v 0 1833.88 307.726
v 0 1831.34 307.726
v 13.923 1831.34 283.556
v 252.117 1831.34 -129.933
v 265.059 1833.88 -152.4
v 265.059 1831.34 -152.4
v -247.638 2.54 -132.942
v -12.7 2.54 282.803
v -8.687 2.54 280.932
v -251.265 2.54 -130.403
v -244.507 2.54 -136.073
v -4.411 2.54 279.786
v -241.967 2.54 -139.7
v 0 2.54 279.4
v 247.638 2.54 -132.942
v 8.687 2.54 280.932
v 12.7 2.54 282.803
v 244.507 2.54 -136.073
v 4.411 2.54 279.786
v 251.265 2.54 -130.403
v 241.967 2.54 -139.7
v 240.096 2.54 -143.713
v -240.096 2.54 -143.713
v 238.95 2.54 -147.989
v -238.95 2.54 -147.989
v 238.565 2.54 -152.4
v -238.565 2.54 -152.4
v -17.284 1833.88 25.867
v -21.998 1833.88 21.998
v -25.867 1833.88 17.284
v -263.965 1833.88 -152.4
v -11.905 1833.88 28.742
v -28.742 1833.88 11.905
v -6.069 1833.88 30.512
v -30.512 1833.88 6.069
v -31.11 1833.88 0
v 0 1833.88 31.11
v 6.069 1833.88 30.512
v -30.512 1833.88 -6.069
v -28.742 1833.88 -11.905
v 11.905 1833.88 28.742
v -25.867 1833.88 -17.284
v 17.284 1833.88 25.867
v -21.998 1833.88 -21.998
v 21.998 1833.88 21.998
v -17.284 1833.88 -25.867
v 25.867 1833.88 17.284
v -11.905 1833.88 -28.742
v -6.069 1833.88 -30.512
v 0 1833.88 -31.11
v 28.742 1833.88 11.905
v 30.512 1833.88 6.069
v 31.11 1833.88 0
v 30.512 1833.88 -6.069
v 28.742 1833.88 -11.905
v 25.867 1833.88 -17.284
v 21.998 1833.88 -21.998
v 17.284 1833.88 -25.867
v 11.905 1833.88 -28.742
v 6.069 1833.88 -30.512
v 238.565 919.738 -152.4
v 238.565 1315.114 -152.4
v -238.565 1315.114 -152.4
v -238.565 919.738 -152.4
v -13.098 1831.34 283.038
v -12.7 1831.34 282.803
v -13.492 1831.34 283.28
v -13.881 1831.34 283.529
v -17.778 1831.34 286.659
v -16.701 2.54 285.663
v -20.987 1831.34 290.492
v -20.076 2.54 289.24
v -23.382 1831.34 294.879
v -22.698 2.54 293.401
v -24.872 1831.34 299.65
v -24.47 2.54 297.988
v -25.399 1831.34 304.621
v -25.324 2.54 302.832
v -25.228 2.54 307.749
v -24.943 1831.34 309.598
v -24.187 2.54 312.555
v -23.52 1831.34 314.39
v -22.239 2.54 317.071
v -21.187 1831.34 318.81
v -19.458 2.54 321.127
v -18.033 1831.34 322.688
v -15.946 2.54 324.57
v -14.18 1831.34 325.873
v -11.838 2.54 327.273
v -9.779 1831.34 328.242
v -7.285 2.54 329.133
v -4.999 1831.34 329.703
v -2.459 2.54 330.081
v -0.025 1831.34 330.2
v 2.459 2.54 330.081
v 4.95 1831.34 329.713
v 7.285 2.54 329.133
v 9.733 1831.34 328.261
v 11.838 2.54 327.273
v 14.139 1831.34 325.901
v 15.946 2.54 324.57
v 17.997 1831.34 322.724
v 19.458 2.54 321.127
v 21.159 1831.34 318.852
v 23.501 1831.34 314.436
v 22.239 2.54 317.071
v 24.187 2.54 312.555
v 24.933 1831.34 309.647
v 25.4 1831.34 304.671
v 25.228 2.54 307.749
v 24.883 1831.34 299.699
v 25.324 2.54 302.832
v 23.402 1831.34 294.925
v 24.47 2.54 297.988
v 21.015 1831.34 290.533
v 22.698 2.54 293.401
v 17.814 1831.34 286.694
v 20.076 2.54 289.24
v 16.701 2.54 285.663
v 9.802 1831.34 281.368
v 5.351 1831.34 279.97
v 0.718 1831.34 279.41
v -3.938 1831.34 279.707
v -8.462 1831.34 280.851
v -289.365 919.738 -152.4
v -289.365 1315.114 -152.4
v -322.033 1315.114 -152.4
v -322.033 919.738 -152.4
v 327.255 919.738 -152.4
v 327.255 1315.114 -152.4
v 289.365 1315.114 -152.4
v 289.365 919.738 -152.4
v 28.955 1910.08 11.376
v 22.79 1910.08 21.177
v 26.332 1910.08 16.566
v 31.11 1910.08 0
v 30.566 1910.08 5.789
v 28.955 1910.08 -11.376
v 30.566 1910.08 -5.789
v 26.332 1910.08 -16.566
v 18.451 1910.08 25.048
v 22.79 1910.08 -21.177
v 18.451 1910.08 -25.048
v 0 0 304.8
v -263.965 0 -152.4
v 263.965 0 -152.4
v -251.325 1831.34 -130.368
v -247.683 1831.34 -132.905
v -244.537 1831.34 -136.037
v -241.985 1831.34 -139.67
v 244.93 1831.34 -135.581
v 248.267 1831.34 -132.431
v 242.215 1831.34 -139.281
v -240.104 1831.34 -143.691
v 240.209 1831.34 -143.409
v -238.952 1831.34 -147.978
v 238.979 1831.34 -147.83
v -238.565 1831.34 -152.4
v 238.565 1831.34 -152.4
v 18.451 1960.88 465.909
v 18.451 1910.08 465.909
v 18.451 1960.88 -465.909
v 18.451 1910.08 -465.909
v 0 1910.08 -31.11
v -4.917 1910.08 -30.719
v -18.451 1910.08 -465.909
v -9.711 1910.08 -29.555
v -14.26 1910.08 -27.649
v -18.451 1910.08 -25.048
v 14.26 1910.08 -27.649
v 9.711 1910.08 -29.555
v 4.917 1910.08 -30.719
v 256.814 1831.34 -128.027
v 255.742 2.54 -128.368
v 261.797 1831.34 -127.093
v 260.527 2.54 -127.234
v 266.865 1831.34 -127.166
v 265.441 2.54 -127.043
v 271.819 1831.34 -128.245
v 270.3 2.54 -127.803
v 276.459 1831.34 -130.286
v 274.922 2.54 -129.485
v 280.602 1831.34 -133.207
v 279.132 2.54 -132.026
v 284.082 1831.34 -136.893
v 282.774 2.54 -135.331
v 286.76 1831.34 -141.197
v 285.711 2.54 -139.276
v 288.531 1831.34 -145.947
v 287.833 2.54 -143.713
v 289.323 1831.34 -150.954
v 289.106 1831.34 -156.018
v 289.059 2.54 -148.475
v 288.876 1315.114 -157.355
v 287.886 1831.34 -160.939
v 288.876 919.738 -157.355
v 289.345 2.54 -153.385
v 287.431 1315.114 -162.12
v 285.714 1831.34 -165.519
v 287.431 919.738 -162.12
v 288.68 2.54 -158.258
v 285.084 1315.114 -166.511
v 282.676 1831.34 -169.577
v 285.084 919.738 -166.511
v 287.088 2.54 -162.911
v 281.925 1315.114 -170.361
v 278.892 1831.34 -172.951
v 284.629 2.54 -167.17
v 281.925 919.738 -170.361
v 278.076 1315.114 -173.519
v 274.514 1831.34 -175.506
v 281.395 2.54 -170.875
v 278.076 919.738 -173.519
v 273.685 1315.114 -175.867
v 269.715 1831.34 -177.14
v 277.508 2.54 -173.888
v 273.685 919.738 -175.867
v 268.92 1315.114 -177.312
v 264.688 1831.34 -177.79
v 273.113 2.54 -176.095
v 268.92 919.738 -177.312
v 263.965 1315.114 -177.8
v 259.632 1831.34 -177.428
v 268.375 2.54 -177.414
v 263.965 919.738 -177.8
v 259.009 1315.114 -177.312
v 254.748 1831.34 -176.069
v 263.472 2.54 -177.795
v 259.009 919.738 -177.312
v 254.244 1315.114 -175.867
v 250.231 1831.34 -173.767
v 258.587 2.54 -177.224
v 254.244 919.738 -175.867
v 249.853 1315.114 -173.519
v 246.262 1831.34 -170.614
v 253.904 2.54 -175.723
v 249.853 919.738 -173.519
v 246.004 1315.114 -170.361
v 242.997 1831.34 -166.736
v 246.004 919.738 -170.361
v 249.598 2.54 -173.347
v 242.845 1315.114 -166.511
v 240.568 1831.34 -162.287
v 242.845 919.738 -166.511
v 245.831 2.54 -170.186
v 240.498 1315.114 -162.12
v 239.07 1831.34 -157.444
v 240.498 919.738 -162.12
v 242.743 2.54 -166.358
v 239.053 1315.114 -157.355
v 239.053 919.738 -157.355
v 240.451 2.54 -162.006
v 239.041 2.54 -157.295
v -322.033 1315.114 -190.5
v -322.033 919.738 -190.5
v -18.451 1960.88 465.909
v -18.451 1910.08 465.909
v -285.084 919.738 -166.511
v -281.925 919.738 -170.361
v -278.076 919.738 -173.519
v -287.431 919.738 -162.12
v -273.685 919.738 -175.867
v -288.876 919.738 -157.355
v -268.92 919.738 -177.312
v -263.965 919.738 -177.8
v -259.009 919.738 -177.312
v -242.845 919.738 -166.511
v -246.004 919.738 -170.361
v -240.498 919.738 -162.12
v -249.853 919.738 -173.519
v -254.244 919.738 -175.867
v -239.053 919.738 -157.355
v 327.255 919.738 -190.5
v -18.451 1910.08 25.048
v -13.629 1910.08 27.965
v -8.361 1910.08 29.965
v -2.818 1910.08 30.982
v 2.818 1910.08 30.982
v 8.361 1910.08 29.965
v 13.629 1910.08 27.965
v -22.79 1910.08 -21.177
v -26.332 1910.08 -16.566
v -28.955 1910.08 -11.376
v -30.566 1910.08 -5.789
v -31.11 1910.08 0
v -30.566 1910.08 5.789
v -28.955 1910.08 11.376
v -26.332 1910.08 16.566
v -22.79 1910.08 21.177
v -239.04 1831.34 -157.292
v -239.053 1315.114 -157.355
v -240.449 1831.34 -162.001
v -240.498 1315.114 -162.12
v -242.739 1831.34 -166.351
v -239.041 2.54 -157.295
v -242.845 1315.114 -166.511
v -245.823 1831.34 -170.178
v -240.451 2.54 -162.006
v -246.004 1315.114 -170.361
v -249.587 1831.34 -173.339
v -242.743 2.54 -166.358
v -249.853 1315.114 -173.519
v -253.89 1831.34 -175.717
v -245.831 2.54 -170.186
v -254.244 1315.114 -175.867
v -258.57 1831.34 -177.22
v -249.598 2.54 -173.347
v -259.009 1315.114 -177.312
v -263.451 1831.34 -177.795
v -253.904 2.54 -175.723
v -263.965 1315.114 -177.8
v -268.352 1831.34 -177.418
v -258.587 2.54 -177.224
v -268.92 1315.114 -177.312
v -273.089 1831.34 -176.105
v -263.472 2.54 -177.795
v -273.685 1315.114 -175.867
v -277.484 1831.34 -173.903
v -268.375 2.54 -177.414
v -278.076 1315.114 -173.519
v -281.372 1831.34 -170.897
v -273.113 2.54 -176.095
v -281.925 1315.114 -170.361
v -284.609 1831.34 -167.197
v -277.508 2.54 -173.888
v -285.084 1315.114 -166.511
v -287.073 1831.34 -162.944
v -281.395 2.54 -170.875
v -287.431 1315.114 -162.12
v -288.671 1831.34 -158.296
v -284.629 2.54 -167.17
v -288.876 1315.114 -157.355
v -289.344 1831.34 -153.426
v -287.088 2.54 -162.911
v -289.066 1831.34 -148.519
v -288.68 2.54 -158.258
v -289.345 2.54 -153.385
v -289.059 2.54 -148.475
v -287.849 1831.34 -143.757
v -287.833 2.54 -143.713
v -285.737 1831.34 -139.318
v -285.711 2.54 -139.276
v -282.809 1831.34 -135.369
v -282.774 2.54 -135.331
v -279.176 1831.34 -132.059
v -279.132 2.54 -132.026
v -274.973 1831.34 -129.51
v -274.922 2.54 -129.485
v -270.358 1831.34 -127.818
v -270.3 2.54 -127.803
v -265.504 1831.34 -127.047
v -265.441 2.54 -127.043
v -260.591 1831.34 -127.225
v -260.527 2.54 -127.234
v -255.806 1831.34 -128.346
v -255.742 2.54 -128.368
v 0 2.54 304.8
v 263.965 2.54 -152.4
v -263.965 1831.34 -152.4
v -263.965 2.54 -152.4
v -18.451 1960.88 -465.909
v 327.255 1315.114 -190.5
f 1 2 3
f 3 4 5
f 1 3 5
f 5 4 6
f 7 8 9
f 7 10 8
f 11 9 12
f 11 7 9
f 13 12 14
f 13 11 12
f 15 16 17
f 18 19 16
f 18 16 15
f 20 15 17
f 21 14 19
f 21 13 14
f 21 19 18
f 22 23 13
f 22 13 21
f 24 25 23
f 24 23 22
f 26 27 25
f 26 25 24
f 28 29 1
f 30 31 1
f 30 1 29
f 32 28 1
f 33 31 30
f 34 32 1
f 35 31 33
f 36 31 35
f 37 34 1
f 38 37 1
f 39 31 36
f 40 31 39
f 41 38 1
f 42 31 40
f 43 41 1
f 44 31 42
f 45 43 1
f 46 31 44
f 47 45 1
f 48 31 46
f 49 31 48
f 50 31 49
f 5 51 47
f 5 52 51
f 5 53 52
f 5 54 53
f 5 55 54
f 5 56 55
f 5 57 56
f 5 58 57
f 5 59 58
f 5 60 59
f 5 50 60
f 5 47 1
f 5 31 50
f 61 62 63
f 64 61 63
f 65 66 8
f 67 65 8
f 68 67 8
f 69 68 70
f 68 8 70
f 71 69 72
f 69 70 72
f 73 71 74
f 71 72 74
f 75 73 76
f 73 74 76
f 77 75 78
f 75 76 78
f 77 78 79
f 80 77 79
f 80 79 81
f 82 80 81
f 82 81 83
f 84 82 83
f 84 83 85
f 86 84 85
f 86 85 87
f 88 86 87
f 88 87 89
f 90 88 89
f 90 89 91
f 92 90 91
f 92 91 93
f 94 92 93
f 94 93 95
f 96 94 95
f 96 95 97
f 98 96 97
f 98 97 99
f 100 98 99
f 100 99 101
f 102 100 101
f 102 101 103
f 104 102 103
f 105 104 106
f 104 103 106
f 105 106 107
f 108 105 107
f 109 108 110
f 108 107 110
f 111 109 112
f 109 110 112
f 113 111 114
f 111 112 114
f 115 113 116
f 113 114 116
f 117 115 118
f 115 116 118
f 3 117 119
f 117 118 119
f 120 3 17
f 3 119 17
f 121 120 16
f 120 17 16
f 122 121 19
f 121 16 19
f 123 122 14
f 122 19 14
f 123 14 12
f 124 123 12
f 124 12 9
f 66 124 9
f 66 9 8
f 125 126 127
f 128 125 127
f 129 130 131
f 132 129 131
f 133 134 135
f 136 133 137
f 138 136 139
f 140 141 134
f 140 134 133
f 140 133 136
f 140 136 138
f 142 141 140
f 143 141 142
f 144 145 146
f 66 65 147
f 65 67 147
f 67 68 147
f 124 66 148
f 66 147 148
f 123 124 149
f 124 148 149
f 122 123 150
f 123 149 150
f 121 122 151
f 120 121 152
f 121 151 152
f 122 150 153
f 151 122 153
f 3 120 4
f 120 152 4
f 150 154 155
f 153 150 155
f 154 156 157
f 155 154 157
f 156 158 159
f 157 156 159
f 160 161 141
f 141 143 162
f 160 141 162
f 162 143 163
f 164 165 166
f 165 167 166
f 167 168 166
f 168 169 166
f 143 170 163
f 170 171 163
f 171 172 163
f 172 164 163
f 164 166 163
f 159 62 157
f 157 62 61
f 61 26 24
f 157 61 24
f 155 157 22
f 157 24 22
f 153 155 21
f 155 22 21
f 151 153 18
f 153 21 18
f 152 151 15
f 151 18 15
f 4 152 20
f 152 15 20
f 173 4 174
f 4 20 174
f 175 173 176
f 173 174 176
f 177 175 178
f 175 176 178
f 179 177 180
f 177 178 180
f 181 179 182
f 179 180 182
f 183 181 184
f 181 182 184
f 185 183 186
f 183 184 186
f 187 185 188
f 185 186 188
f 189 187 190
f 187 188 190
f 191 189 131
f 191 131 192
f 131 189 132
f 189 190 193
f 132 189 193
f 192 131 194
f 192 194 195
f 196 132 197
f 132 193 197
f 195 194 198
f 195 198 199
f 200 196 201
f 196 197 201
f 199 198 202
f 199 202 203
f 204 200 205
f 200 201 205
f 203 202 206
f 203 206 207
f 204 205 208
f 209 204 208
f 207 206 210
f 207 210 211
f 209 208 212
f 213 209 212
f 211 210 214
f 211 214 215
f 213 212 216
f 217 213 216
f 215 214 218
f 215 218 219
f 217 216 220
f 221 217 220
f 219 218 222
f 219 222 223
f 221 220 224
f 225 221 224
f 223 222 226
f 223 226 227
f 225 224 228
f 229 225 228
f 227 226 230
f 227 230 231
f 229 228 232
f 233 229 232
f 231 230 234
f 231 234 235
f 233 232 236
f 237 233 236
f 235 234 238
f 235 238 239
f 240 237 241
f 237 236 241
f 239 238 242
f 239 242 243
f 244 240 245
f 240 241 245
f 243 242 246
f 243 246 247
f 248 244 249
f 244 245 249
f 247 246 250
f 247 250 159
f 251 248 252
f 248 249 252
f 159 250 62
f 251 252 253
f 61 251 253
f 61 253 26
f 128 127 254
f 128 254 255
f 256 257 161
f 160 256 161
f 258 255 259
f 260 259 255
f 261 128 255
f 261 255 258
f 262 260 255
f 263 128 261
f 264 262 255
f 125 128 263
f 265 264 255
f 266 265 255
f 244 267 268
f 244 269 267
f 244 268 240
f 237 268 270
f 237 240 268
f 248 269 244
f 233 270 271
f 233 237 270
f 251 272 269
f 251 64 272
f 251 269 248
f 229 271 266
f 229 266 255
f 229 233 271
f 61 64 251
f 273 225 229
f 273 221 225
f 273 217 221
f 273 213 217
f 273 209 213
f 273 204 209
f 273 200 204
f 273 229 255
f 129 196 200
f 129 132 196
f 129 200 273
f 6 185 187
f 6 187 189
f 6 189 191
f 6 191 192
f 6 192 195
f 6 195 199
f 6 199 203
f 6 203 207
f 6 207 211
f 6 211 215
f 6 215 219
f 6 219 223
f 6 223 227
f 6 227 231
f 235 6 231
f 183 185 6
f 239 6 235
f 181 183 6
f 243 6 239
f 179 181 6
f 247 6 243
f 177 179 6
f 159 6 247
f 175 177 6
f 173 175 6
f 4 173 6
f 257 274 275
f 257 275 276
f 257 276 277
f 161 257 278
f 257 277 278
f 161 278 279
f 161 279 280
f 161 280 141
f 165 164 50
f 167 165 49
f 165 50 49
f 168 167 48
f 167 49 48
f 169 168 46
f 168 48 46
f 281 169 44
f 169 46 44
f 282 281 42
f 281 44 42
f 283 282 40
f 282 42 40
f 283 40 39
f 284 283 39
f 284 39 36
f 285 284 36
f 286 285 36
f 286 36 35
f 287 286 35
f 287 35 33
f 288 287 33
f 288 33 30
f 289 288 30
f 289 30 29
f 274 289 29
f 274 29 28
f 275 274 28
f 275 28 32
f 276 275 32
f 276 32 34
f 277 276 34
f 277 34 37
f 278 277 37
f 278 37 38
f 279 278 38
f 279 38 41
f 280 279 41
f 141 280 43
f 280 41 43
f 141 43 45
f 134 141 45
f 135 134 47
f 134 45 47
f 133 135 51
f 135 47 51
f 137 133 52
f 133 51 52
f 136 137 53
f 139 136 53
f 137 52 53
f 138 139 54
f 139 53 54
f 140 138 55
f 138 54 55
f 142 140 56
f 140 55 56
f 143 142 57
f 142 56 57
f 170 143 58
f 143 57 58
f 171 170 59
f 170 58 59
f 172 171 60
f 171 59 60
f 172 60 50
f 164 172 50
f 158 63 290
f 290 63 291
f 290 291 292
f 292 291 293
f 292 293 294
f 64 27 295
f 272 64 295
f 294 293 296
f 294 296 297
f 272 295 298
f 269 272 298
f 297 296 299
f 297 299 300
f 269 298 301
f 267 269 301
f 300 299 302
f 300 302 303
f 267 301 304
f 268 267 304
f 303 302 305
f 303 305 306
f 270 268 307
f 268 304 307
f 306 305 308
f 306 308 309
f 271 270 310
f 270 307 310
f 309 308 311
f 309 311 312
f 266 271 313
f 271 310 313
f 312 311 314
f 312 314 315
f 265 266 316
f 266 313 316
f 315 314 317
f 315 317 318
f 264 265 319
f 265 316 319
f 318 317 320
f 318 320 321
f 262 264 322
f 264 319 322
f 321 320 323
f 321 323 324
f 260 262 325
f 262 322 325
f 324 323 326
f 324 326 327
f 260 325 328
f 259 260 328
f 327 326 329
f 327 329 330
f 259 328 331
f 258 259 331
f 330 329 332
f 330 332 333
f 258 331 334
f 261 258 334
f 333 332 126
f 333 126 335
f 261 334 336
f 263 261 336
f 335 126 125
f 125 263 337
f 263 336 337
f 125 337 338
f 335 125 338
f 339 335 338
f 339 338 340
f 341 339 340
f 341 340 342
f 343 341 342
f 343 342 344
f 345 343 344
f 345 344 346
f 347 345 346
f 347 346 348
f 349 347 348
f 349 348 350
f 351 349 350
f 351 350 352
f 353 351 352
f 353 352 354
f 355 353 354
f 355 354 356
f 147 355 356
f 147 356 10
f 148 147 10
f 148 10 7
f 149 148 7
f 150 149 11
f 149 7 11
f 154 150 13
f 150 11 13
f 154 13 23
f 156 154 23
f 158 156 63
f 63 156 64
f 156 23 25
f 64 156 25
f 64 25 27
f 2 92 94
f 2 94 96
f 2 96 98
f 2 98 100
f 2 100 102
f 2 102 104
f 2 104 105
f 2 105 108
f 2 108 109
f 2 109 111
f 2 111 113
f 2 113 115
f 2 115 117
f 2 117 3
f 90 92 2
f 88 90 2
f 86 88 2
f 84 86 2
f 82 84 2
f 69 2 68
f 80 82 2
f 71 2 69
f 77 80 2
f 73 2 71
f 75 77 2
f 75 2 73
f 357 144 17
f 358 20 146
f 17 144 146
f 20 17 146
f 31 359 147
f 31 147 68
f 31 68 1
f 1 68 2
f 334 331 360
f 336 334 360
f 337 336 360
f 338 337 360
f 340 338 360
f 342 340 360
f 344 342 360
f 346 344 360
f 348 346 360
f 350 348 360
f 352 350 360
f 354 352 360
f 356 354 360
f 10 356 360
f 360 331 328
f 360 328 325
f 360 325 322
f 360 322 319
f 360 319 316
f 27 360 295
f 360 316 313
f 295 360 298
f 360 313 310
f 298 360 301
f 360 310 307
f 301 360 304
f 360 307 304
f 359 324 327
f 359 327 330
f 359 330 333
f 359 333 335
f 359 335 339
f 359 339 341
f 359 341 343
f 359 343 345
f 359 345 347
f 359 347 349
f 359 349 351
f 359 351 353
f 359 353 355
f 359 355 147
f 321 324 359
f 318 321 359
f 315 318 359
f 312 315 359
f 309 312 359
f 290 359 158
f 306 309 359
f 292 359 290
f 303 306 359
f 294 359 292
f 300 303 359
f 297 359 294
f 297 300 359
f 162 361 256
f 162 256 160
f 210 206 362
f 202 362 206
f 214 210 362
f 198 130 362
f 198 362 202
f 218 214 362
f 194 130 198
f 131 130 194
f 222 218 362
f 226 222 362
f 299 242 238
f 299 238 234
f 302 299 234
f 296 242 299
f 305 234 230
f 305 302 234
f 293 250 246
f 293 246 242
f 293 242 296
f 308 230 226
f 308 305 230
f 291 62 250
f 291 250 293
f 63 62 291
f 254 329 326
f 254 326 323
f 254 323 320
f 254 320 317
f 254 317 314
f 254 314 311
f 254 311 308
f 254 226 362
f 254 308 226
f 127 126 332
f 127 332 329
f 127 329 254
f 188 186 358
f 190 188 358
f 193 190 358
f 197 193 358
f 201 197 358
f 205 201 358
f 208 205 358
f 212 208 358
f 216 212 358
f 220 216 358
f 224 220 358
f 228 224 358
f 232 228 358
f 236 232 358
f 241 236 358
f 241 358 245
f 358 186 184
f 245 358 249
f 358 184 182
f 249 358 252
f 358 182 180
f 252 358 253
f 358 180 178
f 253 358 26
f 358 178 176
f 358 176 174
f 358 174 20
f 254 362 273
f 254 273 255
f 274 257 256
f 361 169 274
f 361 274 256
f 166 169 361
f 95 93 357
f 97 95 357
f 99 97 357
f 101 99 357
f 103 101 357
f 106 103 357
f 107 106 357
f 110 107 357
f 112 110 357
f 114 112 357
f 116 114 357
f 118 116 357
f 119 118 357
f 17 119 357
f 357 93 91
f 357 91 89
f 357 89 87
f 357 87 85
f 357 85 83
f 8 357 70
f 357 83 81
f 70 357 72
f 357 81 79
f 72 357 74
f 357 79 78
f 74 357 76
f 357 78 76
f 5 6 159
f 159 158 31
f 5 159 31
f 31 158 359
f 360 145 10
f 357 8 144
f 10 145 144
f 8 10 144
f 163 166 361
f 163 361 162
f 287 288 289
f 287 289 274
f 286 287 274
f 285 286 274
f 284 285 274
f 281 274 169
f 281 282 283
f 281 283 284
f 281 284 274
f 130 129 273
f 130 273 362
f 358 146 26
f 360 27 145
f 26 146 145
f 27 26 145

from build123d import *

# Parameters (mm, degrees)
BOSS_EXTRUDE1_DEPTH = 2.54
SKETCH2_R           = 25.4
BOSS_EXTRUDE2_DEPTH = 1828.8
BOSS_EXTRUDE3_DEPTH = 2.54
SKETCH4_R           = 31.109831221
BOSS_EXTRUDE5_DEPTH = 76.2
SKETCH5_W           = 36.901431936
SKETCH5_H           = 931.81733007
BOSS_EXTRUDE7_DEPTH = 50.8
BOSS_EXTRUDE8_DEPTH = 38.1


with BuildPart() as part:
    # Sketch1 → Boss-Extrude1 (new body)
    with BuildSketch(Plane(origin=(0, 0, 0), x_dir=(1, 0, 0), z_dir=(0, 1, 0))):
        Polygon((0, -304.8), (263.964543074, 152.4), (-263.964543074, 152.4), align=None)
    extrude(amount=BOSS_EXTRUDE1_DEPTH)

    # Sketch2 → Boss-Extrude2 (add)
    with BuildSketch(Plane(origin=(0, 2.54, 0), x_dir=(1, 0, 0), z_dir=(0, 1, 0))):
        with Locations(Location((0, -304.8, 0), (0, 0, 120))):
            Circle(SKETCH2_R)
        with Locations((-263.964543074, 152.4)):
            Circle(SKETCH2_R)
        with Locations(Location((263.964543074, 152.4, 0), (0, 0, 180))):
            Circle(SKETCH2_R)
    extrude(amount=BOSS_EXTRUDE2_DEPTH)

    # Sketch3 → Boss-Extrude3 (add)
    with BuildSketch(Plane(origin=(0, 1831.34, 0), x_dir=(1, 0, 0), z_dir=(0, 1, 0))):
        Polygon((-263.964543074, 152.4), (0, -307.726008903), (265.059219048, 152.4), align=None)
    extrude(amount=BOSS_EXTRUDE3_DEPTH)

    # Sketch4 → Boss-Extrude5 (add)
    with BuildSketch(Plane(origin=(0, 1833.88, 0), x_dir=(1, 0, 0), z_dir=(0, 1, 0))):
        with Locations(Location((0, 0, 0), (0, 0, 90))):
            Circle(SKETCH4_R)
    extrude(amount=BOSS_EXTRUDE5_DEPTH)

    # Sketch5 → Boss-Extrude7 (add)
    with BuildSketch(Plane(origin=(0, 1910.08, 0), x_dir=(1, 0, 0), z_dir=(0, 1, 0))):
        Rectangle(SKETCH5_W, SKETCH5_H)
    extrude(amount=BOSS_EXTRUDE7_DEPTH)

    # 3DSketch1 → Boss-Extrude8 (add)
    with BuildSketch(Plane(origin=(327.254814747, 1315.114471395, -152.4), x_dir=(-0.8541064020391608, -0.5200983118562486, 0), z_dir=(0, 0, 1))):
        Polygon((0, 0), (554.560573308, -337.693310003), (760.195046997, 0), (205.634473689, 337.693310003), align=None)
    extrude(amount=-BOSS_EXTRUDE8_DEPTH)


solid = part.part
